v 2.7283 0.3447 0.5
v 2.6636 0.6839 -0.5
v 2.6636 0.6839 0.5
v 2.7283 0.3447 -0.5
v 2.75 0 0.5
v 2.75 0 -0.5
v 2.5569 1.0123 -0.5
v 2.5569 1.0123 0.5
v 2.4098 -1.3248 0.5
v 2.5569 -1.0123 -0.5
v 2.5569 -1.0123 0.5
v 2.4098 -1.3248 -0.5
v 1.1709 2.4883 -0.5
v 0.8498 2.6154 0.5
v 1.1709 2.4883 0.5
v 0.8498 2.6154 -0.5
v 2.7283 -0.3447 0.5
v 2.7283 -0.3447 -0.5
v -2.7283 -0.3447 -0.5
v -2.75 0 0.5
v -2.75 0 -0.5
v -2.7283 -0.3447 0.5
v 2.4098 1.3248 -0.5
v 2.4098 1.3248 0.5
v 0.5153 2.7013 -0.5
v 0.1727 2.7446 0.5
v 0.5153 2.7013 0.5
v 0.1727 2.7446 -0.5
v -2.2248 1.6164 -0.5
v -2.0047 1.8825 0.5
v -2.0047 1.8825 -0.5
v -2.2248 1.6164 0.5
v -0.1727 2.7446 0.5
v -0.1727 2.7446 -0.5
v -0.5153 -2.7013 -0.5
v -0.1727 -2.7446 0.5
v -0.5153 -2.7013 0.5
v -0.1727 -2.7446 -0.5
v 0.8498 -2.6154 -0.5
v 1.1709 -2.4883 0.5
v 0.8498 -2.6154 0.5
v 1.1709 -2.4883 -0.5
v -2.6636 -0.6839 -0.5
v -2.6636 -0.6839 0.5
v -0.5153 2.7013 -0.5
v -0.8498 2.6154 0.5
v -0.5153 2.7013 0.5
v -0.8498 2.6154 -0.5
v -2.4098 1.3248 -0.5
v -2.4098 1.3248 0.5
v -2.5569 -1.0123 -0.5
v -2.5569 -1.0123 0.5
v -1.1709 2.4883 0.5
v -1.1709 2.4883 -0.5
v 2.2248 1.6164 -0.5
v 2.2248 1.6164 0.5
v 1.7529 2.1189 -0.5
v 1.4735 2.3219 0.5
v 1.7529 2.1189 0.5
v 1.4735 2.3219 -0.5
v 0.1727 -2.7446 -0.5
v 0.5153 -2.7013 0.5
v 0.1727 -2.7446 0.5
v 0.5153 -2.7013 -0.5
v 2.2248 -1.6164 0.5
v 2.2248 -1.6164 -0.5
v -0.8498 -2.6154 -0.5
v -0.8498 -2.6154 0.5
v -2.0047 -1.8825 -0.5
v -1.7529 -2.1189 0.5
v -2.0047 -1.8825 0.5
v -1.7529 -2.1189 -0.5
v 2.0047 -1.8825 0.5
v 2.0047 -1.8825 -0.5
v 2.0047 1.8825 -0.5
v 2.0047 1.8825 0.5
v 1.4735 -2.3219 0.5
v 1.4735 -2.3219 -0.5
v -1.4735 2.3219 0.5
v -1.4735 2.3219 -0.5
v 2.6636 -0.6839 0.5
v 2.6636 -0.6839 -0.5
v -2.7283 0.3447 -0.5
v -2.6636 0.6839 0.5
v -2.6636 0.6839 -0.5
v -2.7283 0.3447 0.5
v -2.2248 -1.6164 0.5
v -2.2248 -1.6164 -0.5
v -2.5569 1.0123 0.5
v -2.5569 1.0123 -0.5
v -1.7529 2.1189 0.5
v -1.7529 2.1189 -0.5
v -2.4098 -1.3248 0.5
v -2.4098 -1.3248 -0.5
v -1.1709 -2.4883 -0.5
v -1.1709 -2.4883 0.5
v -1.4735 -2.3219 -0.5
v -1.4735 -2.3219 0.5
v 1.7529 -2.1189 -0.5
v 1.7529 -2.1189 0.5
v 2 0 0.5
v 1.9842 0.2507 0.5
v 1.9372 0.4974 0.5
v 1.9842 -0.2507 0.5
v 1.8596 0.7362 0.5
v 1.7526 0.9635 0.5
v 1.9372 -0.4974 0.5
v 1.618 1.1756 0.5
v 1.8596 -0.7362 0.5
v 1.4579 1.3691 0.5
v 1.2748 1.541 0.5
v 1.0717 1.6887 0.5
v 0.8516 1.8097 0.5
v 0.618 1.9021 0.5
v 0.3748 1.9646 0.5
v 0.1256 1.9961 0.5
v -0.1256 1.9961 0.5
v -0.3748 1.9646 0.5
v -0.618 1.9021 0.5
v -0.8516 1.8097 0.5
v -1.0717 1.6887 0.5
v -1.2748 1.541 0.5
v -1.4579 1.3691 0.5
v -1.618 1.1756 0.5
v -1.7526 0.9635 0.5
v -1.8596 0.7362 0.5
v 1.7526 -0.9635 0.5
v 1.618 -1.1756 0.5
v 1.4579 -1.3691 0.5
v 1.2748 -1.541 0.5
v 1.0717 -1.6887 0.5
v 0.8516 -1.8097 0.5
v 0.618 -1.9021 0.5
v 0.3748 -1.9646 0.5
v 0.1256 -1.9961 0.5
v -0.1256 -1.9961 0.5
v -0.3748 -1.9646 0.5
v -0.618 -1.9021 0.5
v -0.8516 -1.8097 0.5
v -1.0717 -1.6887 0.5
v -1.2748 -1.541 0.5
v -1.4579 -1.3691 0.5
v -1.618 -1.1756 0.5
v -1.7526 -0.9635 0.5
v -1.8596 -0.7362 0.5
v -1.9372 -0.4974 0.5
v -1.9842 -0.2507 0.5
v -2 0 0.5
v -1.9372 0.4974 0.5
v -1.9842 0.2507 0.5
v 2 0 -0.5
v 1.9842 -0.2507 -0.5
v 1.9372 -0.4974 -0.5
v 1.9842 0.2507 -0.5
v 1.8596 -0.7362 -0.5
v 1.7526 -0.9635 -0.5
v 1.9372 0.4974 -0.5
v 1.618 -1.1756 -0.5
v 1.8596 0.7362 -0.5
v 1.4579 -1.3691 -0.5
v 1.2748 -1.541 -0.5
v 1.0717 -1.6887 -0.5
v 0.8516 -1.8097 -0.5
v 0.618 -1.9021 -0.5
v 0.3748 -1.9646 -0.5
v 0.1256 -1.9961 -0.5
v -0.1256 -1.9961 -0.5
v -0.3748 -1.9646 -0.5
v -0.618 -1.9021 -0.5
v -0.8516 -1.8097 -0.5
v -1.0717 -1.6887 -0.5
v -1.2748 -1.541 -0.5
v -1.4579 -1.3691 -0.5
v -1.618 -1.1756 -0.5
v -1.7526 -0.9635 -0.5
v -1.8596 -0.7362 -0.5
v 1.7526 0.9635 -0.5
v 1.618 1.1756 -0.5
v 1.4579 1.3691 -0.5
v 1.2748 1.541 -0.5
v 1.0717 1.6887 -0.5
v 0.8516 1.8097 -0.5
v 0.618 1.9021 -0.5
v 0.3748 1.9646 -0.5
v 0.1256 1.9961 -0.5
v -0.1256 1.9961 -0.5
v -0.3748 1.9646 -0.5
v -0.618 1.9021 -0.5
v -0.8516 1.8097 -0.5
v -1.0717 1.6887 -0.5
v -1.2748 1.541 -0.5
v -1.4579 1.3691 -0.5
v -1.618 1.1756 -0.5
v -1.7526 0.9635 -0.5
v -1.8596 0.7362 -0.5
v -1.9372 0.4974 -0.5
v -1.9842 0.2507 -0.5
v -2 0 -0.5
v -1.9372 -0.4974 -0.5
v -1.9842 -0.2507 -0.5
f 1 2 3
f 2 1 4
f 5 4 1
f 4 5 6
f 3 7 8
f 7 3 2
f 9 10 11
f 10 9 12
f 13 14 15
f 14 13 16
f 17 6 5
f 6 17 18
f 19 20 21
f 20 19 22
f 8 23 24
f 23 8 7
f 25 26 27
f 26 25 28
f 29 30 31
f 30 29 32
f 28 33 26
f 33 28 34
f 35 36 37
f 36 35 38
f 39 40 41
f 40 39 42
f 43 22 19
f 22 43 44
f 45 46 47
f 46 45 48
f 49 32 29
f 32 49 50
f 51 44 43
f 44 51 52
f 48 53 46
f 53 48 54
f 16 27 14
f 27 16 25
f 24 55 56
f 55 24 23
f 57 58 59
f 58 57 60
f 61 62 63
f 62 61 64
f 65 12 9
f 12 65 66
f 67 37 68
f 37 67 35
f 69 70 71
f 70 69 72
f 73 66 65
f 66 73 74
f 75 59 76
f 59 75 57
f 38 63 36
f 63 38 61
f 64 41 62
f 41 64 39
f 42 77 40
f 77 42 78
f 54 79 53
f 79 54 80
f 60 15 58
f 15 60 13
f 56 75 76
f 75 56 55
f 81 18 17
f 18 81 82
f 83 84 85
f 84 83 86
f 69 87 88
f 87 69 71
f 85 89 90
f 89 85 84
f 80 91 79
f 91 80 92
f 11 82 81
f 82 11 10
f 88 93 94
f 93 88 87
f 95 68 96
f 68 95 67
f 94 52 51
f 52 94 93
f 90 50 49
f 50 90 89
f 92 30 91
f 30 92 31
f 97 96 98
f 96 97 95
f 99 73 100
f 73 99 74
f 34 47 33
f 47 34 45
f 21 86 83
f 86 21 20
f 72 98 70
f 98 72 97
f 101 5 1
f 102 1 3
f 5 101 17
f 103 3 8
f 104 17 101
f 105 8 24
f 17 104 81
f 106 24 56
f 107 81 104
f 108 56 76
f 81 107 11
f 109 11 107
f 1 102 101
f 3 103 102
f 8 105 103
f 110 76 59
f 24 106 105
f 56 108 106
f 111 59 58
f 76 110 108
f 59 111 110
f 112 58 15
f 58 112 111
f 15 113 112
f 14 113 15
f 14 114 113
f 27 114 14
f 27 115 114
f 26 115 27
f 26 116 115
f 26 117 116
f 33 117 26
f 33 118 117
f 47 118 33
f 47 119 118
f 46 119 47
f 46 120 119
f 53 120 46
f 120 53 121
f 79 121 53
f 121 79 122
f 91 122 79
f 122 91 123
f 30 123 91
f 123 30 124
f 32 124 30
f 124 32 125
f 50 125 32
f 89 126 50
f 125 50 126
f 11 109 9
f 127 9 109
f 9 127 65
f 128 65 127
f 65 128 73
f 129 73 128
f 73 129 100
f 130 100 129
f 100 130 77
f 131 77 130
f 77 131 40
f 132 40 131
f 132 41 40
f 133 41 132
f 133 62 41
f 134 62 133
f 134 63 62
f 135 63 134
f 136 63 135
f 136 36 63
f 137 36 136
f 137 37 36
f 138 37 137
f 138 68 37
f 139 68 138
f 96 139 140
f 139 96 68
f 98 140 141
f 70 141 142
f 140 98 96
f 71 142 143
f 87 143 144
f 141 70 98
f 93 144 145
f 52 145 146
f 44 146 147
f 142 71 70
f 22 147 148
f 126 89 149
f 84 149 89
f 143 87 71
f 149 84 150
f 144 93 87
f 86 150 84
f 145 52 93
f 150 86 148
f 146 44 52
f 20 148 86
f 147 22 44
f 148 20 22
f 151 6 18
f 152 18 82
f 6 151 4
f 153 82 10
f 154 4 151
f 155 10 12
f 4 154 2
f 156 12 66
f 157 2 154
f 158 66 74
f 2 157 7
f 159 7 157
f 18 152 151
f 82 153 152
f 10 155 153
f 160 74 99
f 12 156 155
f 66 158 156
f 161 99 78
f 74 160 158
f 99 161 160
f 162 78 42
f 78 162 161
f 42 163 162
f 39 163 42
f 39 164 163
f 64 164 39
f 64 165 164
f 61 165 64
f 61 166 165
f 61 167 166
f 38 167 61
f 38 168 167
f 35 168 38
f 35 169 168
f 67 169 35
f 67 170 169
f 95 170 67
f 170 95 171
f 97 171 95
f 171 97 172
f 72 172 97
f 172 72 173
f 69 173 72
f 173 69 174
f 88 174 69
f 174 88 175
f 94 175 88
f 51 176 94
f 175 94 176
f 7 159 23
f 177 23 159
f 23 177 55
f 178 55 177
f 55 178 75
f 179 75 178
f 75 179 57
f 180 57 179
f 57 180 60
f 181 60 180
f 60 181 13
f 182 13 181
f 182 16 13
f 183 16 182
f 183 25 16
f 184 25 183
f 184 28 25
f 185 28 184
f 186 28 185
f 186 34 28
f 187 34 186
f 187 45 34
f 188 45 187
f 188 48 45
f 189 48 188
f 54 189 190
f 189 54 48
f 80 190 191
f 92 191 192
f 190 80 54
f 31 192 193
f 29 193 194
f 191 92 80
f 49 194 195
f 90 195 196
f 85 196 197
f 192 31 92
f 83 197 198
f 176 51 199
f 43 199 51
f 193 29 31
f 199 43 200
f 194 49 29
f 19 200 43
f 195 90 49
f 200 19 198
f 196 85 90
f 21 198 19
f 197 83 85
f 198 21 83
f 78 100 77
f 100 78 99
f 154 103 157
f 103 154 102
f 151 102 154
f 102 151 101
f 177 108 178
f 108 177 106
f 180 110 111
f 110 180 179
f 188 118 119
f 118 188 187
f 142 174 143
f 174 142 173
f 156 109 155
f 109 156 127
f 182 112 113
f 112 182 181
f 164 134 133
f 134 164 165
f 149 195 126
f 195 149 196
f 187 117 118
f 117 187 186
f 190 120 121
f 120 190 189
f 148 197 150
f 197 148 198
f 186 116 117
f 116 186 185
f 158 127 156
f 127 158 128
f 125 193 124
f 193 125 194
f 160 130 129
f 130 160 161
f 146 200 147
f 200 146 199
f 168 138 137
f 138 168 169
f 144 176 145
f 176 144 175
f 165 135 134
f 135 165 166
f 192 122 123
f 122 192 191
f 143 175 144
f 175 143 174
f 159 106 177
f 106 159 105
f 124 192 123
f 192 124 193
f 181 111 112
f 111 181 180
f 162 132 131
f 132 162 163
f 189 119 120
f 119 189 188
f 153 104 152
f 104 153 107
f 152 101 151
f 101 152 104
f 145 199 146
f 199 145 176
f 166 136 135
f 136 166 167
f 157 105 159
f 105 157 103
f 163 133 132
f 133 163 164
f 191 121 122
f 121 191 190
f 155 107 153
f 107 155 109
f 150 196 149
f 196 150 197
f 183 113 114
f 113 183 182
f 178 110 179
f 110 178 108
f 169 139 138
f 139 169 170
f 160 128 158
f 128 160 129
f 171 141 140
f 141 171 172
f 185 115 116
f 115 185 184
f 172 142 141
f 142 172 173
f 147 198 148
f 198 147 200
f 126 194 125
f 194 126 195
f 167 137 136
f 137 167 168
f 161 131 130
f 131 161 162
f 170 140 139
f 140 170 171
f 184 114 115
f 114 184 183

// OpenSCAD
$fn = 50;


difference() {
	union() {
		translate(v = [0, 0, -0.5000000000]) {
			cylinder(h = 1, r = 2.7500000000);
		}
	}
	union() {
		translate(v = [0, 0, -100.0000000000]) {
			cylinder(h = 200, r = 2.0000000000);
		}
	}
}
